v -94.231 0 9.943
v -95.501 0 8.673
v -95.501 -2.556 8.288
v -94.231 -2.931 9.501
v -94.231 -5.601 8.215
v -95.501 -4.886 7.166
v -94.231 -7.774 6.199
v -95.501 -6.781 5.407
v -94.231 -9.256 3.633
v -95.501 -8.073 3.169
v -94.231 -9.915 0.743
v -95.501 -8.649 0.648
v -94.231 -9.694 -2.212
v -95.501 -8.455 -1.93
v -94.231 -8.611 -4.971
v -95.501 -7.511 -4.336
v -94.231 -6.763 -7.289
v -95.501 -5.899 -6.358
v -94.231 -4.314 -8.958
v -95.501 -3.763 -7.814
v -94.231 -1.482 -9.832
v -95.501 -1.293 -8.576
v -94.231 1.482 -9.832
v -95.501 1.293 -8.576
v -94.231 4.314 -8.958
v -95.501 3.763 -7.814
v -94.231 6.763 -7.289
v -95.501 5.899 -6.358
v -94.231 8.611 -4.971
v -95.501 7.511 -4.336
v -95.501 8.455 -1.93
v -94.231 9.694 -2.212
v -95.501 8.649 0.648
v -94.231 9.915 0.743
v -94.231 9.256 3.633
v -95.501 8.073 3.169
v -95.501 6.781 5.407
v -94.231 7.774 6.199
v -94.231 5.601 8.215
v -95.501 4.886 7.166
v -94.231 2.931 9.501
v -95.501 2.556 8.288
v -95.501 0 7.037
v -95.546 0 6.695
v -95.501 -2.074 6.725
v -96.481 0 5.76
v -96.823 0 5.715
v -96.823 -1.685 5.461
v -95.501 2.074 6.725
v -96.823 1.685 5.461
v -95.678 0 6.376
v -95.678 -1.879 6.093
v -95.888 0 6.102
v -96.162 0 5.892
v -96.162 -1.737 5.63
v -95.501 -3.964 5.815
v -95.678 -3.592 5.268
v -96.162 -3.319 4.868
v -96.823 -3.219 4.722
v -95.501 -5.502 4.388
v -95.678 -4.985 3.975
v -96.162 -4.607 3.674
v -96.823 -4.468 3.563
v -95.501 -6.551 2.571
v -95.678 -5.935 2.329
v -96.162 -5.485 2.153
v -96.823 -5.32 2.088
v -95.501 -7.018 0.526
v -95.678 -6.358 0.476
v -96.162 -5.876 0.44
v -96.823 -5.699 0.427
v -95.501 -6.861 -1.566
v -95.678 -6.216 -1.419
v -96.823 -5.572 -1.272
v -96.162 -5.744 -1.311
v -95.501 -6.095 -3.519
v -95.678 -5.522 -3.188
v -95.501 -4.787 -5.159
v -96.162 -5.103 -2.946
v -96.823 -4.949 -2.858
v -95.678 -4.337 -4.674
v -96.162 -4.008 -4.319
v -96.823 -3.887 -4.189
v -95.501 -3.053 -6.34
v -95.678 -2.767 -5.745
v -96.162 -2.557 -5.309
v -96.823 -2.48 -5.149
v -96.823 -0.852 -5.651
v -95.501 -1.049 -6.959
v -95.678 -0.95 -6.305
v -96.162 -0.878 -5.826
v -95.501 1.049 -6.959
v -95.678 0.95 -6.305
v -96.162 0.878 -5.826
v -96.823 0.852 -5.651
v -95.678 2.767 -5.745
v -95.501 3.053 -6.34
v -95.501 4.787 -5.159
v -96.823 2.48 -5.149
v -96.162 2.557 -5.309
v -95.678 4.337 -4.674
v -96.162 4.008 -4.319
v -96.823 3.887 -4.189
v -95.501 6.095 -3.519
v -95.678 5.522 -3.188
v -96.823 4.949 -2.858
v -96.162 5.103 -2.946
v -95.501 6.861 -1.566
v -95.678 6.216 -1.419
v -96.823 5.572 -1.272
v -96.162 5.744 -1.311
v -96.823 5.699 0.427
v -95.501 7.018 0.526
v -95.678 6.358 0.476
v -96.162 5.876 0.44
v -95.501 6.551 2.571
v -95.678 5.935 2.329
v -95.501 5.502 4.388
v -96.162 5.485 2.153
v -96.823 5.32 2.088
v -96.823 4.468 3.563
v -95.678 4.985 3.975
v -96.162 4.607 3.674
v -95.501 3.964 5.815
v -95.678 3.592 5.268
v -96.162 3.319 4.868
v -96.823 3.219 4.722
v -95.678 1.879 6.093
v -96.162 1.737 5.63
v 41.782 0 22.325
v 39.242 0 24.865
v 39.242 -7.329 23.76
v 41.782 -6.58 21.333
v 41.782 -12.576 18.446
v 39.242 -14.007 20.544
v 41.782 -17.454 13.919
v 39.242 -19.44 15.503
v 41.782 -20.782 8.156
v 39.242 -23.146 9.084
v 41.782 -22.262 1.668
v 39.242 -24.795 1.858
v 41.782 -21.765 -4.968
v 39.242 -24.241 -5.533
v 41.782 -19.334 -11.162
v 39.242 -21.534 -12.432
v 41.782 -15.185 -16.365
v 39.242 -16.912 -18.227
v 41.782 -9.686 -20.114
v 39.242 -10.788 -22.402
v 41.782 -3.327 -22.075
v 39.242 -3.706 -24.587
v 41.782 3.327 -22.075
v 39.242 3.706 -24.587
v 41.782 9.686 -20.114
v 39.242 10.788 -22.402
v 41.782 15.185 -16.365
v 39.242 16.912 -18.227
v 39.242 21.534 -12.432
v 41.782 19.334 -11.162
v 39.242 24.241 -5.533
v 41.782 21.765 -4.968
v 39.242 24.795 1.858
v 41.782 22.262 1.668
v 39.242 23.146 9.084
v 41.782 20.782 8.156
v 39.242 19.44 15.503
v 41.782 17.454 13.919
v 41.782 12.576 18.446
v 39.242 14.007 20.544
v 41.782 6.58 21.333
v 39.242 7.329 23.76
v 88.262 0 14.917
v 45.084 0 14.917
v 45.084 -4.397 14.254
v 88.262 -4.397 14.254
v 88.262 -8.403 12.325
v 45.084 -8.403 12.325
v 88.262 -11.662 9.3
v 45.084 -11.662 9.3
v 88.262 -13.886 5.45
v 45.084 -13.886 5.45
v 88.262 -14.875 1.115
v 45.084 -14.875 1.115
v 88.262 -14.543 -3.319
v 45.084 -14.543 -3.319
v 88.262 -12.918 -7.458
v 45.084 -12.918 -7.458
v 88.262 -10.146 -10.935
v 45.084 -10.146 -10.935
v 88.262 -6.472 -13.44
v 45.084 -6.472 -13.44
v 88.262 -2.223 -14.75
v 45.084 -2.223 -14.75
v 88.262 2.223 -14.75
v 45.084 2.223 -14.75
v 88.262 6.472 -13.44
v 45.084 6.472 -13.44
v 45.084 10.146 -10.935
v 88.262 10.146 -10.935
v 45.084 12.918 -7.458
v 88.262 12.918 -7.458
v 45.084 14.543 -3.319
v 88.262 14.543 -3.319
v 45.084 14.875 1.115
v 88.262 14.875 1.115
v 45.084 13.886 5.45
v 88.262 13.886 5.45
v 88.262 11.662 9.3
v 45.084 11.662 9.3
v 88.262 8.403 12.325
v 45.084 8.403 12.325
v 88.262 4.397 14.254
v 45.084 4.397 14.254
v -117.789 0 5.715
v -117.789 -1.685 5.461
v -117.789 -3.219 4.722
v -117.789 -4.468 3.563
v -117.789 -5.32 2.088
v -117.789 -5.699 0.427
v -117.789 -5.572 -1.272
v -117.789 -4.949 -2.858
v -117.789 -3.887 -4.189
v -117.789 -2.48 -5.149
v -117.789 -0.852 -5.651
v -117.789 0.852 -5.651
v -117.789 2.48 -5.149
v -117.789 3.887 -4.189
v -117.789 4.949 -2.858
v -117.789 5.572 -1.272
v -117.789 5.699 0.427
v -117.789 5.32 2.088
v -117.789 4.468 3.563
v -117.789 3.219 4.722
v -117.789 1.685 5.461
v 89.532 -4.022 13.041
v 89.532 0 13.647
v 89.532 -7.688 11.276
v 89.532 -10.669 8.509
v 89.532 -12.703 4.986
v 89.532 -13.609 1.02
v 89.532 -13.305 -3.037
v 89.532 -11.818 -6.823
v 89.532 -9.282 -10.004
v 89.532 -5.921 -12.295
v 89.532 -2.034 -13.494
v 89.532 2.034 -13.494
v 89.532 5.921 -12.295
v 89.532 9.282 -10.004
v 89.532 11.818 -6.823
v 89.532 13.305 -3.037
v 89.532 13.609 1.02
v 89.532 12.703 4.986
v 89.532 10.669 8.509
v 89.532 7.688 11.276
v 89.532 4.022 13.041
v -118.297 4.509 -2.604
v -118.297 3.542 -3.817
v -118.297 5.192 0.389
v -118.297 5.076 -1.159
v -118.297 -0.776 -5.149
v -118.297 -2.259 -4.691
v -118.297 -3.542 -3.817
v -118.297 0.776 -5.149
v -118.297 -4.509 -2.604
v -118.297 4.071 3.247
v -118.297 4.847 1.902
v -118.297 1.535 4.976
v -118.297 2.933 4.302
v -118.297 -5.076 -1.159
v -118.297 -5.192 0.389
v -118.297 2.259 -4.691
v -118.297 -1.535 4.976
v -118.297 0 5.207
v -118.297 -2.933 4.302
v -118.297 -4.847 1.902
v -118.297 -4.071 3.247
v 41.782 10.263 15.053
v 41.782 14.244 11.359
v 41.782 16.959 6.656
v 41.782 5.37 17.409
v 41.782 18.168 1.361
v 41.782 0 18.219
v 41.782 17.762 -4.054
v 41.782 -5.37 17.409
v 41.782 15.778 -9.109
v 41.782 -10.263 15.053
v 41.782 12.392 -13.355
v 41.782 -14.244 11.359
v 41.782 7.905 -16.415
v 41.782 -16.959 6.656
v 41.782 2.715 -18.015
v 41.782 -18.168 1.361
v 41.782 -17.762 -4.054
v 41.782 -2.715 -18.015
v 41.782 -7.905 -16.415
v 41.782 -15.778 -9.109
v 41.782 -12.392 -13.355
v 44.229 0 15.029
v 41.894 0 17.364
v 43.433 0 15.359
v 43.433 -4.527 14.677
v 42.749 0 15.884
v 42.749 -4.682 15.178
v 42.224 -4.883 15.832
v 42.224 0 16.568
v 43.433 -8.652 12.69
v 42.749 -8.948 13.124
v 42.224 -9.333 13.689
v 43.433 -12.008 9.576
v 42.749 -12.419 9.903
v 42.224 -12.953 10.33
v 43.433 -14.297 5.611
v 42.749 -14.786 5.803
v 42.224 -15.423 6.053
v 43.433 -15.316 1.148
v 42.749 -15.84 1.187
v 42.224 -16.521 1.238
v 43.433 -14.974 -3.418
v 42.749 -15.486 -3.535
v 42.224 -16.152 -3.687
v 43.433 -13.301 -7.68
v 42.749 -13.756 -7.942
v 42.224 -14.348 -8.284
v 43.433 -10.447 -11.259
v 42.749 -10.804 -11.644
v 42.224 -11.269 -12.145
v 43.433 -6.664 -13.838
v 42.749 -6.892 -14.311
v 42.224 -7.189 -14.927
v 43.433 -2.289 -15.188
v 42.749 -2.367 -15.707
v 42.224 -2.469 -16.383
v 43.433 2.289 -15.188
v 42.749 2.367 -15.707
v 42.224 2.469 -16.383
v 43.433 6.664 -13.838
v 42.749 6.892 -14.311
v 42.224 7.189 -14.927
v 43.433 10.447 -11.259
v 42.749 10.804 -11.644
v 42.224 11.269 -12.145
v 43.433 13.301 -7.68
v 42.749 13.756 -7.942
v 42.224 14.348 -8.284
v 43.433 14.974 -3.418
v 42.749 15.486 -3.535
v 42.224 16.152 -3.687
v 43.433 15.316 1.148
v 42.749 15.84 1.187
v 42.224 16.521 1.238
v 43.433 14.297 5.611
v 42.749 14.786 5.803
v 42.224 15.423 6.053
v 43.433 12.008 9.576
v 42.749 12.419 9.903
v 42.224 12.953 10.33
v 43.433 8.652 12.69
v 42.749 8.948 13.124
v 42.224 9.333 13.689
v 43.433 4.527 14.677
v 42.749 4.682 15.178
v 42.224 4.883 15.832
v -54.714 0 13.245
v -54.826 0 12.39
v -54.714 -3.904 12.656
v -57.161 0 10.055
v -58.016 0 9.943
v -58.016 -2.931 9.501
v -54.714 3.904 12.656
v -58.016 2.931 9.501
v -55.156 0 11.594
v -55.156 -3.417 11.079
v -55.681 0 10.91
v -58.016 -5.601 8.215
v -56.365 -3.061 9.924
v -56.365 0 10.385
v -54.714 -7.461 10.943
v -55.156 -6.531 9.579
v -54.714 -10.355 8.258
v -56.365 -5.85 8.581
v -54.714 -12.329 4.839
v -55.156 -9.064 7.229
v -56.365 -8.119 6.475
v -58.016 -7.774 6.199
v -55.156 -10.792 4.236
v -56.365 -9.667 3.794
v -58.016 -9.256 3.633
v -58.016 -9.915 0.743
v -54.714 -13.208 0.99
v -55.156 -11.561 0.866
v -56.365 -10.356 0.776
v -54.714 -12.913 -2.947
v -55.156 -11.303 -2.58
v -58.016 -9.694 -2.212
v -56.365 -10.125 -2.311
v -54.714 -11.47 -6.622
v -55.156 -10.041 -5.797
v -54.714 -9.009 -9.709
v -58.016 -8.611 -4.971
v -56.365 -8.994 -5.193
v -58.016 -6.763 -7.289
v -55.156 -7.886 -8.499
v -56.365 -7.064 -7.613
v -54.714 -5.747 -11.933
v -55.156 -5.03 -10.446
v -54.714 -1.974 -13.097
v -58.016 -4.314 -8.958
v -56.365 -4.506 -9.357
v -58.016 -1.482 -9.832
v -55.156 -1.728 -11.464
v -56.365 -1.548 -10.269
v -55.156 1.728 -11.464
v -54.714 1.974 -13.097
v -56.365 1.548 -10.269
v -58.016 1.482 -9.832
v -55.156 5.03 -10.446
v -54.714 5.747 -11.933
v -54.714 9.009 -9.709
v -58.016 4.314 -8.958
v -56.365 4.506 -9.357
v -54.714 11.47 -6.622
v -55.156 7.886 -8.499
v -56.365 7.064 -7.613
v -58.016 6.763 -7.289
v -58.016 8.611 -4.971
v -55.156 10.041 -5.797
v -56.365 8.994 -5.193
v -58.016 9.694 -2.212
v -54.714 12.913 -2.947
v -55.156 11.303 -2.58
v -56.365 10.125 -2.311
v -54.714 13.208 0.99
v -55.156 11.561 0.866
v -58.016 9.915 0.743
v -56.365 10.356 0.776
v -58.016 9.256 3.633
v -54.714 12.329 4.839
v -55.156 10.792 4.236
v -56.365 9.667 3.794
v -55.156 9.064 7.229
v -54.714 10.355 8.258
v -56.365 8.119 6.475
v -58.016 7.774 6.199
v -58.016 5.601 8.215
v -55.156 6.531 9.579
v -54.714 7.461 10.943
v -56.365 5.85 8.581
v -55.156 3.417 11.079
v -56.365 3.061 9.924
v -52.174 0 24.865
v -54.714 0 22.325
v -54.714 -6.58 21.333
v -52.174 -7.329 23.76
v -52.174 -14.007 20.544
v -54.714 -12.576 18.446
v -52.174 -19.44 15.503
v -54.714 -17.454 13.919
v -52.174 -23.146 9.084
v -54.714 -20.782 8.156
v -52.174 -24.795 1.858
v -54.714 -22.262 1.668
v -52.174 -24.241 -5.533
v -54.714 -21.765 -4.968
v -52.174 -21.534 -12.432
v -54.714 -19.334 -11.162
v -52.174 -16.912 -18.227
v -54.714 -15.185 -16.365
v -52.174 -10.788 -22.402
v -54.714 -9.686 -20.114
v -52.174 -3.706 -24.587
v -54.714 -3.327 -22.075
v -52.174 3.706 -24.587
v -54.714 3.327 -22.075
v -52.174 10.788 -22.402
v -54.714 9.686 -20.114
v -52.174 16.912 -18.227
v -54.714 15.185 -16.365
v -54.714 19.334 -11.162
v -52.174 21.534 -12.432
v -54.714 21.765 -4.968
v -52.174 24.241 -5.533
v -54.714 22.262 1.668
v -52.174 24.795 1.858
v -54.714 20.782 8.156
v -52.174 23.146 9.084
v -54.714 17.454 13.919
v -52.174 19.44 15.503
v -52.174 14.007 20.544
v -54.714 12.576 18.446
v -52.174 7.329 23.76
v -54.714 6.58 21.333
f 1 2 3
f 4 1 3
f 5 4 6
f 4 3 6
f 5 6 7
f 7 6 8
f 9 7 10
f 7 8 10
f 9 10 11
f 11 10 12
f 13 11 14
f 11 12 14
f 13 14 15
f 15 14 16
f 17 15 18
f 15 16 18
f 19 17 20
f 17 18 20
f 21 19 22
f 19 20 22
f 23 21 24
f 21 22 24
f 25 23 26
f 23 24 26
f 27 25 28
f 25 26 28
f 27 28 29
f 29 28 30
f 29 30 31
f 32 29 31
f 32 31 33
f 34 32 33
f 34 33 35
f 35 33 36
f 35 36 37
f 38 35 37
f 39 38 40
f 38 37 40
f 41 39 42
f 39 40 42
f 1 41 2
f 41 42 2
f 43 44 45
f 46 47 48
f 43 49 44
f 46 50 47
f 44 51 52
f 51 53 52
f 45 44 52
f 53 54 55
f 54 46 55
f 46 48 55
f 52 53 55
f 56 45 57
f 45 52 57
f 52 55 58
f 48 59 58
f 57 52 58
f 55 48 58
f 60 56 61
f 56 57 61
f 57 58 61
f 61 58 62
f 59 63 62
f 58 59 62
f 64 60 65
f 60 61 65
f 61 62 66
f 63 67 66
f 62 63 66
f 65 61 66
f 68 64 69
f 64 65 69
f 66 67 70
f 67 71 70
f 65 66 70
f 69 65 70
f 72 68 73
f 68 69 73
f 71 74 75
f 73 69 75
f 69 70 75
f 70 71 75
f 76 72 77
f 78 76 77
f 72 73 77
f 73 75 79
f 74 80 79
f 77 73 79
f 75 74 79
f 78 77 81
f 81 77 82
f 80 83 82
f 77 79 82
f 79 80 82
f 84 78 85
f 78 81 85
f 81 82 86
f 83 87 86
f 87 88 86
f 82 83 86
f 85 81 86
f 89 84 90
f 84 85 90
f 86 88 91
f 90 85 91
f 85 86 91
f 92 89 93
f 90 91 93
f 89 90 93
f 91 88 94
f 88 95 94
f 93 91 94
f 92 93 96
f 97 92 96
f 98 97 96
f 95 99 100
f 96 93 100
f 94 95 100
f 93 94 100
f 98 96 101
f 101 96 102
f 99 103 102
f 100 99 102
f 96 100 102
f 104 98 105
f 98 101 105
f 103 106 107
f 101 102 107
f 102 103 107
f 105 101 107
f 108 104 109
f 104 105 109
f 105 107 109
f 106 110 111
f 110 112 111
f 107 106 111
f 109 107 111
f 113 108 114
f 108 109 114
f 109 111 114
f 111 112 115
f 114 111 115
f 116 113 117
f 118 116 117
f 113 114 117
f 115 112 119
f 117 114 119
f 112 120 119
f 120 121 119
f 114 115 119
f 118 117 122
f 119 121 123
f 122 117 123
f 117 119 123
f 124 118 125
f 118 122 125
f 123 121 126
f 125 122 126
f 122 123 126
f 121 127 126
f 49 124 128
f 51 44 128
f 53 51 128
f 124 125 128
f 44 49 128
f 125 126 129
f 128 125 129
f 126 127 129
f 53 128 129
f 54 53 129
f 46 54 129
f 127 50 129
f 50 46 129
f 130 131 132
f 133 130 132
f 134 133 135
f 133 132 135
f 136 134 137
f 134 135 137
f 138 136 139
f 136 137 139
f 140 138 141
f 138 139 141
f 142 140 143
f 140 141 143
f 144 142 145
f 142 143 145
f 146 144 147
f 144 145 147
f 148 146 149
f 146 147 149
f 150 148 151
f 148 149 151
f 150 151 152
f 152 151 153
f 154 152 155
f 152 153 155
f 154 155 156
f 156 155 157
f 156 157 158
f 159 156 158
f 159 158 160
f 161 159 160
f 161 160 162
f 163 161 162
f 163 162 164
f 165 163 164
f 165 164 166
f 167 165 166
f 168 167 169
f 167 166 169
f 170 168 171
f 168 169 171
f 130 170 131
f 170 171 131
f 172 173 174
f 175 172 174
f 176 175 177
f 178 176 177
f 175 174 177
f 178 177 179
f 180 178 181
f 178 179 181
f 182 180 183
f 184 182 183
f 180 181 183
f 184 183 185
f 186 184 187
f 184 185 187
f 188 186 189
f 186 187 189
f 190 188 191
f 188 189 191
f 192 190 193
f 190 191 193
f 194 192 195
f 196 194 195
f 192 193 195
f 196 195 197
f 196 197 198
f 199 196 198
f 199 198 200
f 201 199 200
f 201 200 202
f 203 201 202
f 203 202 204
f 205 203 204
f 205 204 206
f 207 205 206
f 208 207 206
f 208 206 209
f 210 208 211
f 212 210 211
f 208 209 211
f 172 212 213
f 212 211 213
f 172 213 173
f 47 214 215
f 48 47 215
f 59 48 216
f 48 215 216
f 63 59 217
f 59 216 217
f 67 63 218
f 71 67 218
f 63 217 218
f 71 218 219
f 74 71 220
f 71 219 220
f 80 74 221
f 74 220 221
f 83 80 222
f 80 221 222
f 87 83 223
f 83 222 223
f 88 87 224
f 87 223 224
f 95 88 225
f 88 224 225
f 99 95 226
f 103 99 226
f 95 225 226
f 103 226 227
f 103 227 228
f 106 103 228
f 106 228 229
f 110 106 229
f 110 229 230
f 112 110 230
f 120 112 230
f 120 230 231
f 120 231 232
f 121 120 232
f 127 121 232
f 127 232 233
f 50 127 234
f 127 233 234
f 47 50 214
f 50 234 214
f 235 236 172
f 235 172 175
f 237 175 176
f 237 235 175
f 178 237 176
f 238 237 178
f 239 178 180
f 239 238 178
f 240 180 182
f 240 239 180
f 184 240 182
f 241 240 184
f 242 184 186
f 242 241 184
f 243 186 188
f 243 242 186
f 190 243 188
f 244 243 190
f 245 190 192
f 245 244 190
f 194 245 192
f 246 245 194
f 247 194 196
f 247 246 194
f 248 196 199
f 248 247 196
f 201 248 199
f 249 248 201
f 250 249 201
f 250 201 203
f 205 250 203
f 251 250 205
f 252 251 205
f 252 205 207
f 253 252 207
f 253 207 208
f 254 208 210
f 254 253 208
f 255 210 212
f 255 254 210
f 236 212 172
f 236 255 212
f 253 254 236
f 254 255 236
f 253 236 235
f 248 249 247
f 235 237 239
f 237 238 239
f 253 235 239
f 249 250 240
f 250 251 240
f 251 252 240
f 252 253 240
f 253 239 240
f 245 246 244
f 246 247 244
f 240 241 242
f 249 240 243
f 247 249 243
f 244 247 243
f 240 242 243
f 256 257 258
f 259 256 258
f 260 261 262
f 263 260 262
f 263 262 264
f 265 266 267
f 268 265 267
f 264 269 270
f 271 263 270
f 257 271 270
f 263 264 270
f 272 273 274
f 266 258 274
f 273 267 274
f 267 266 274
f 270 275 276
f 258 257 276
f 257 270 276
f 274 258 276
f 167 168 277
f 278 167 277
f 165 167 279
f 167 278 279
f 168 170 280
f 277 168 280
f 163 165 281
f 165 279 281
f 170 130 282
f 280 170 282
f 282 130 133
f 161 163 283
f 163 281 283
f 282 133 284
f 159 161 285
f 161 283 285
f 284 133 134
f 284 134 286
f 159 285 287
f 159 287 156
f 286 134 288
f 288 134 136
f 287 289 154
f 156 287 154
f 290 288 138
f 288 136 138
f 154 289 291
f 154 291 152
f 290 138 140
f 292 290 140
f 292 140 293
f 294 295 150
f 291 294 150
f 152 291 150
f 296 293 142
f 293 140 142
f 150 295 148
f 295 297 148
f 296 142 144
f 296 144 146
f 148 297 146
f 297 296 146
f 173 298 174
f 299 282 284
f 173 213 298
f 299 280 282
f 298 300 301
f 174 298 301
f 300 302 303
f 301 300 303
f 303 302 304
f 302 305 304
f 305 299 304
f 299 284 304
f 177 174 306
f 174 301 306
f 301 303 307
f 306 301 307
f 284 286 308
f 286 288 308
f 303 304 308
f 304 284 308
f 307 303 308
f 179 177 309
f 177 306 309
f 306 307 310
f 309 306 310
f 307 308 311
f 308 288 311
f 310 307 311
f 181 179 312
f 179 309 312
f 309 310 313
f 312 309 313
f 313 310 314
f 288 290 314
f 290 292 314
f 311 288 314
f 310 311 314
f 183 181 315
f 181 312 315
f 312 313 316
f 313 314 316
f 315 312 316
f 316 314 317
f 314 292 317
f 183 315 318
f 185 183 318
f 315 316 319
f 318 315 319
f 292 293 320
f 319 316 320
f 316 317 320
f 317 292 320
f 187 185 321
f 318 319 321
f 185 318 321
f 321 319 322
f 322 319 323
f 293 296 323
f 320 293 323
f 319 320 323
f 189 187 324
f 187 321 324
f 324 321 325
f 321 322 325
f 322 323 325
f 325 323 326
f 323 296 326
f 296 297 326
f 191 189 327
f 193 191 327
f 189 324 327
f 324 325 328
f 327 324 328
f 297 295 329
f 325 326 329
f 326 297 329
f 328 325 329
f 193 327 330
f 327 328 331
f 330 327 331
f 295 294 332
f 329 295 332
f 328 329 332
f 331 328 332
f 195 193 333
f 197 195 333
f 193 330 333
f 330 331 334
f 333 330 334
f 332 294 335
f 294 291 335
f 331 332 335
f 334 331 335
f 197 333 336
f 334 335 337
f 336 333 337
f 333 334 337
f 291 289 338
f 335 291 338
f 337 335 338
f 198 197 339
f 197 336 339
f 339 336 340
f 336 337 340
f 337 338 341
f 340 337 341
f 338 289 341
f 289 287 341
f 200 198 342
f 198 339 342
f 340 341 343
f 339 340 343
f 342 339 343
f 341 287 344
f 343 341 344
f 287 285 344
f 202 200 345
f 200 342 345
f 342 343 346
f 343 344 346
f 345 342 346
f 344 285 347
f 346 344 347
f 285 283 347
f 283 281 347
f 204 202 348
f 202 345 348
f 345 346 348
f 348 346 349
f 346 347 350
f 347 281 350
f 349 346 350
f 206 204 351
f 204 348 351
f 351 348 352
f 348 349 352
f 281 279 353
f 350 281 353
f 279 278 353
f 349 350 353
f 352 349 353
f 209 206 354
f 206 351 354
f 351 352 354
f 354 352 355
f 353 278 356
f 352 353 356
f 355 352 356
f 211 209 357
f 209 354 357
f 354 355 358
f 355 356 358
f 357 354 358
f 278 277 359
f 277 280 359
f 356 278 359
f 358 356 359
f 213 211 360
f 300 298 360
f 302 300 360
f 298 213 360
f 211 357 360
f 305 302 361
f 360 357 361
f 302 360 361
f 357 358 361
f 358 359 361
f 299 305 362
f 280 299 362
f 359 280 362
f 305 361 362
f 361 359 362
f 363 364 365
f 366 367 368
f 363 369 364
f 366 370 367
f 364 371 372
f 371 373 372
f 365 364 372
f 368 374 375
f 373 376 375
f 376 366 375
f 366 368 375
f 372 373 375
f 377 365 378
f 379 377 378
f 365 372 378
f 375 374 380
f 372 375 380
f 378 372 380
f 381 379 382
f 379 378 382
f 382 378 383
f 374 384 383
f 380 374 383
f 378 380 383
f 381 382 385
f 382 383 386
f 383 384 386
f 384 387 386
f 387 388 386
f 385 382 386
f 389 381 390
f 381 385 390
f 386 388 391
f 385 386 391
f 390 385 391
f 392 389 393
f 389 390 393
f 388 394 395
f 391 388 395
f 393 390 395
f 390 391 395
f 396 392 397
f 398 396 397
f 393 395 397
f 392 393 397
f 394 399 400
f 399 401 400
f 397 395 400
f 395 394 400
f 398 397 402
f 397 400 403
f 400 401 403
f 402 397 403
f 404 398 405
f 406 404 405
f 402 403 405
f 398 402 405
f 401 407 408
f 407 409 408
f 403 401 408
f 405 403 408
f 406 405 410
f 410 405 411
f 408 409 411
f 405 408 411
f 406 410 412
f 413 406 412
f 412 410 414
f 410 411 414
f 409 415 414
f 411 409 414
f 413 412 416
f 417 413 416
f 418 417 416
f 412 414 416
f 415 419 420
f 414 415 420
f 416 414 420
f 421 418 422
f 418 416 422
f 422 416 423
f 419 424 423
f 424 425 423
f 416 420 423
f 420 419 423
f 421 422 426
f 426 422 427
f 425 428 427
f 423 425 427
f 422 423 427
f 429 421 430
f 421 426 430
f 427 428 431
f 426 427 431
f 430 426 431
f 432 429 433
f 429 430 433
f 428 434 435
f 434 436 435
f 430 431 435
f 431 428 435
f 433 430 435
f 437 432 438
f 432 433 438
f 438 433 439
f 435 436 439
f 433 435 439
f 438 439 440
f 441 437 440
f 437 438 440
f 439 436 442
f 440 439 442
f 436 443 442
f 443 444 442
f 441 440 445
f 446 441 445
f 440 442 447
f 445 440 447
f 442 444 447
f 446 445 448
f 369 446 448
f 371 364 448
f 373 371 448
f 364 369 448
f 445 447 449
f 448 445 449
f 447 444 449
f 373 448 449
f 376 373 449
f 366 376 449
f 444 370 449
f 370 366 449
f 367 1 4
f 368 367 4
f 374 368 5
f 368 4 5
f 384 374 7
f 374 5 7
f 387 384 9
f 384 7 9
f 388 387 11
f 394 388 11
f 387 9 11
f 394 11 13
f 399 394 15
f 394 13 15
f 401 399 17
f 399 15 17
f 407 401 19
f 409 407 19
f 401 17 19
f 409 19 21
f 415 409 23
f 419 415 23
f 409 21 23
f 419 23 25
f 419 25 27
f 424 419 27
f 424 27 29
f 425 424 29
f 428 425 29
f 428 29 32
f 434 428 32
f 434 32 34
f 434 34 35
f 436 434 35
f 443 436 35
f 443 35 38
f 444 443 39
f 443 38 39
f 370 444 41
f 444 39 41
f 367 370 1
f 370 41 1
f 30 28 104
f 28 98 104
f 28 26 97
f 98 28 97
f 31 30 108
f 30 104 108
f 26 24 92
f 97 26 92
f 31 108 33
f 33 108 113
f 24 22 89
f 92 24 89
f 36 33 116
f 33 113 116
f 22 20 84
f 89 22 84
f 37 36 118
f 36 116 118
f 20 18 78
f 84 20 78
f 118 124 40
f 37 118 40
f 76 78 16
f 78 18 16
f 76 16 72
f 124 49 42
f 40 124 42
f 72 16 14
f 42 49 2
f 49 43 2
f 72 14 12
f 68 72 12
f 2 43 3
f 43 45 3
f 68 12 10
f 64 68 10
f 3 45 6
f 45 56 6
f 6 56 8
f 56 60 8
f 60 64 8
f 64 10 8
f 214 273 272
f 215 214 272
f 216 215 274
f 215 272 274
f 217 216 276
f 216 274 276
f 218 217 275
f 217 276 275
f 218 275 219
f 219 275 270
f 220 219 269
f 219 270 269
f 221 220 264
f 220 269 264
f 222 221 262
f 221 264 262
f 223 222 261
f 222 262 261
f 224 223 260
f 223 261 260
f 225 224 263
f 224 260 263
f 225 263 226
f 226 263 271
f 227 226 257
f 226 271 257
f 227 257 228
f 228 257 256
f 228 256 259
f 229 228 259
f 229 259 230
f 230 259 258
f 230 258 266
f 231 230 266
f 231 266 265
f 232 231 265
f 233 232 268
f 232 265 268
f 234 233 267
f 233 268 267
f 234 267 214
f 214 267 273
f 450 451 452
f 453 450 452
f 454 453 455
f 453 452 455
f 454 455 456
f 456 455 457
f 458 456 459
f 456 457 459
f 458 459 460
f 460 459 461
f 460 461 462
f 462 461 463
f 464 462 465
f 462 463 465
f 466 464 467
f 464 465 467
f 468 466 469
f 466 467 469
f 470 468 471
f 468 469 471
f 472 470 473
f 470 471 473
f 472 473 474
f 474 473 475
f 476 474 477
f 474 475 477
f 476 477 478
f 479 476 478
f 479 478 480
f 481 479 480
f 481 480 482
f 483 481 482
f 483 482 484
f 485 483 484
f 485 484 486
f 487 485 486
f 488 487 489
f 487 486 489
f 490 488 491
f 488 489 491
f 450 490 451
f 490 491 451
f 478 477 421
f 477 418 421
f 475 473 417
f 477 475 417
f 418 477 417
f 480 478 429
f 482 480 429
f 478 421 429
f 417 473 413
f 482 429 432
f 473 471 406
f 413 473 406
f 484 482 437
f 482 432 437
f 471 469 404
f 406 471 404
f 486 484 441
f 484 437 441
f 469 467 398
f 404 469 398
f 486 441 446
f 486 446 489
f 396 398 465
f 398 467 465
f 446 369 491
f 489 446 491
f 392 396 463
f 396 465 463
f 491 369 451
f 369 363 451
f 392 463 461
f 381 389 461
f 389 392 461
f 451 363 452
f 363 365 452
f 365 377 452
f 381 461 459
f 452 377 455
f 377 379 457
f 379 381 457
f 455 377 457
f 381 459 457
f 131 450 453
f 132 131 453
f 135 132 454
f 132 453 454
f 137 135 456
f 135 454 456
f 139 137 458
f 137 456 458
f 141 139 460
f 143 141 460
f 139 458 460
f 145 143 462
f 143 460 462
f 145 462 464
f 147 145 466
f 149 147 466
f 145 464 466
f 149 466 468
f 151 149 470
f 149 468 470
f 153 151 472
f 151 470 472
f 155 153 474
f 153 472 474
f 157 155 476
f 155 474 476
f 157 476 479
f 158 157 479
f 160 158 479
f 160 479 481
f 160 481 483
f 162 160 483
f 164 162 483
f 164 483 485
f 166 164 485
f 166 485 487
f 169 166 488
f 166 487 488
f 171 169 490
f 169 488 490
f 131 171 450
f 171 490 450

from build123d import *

# Parameters (mm, degrees)
F2_SIZE = 2.54
F3_SIZE = 2.54
F4_SIZE = 1.27
F5_SIZE = 0.508
F6_SIZE = 1.27


with BuildPart() as f1:
    # F0 (on Front) → F1 (revolve)
    with BuildSketch(Plane.XZ):
        with BuildLine():
            Line((-58.015915, 9.94281), (-95.500656, 9.94281))
            Line((-95.500656, 9.94281), (-95.500656, 7.037411))
            ThreePointArc((-95.500656, 7.037411), (-95.887981, 6.102325), (-96.823067, 5.715))
            Line((-96.823067, 5.715), (-118.297269, 5.715))
            Line((-118.297269, 5.715), (-118.297269, 0))
            Line((-118.297269, 0), (89.53189, 0))
            Line((89.53189, 0), (89.53189, 14.916802))
            Line((89.53189, 14.916802), (45.083549, 14.916802))
            ThreePointArc((45.083549, 14.916802), (42.748683, 15.883936), (41.781549, 18.218802))
            Line((41.781549, 18.218802), (41.781549, 24.864788))
            Line((41.781549, 24.864788), (-54.713915, 24.864788))
            Line((-54.713915, 24.864788), (-54.713915, 13.24481))
            ThreePointArc((-54.713915, 13.24481), (-55.681049, 10.909944), (-58.015915, 9.94281))
        make_face()
    revolve(axis=Axis((-14.38269, 0, 0), (1, 0, 0)))

    # F2
    f2_edges = [f1.edges().sort_by_distance(p)[0] for p in [
        (41.781549, 0, -24.864788),
    ]]
    chamfer(f2_edges, length=F2_SIZE)

    # F3
    f3_edges = [f1.edges().sort_by_distance(p)[0] for p in [
        (-54.713915, 0, -24.864788),
    ]]
    chamfer(f3_edges, length=F3_SIZE)

    # F4
    f4_edges = [f1.edges().sort_by_distance(p)[0] for p in [
        (-95.500656, 0, -9.94281),
    ]]
    chamfer(f4_edges, length=F4_SIZE)

    # F5
    f5_edges = [f1.edges().sort_by_distance(p)[0] for p in [
        (-118.297269, 0, -5.715),
    ]]
    chamfer(f5_edges, length=F5_SIZE)

    # F6
    f6_edges = [f1.edges().sort_by_distance(p)[0] for p in [
        (89.53189, 0, -14.916802),
    ]]
    chamfer(f6_edges, length=F6_SIZE)


solid = f1.part
